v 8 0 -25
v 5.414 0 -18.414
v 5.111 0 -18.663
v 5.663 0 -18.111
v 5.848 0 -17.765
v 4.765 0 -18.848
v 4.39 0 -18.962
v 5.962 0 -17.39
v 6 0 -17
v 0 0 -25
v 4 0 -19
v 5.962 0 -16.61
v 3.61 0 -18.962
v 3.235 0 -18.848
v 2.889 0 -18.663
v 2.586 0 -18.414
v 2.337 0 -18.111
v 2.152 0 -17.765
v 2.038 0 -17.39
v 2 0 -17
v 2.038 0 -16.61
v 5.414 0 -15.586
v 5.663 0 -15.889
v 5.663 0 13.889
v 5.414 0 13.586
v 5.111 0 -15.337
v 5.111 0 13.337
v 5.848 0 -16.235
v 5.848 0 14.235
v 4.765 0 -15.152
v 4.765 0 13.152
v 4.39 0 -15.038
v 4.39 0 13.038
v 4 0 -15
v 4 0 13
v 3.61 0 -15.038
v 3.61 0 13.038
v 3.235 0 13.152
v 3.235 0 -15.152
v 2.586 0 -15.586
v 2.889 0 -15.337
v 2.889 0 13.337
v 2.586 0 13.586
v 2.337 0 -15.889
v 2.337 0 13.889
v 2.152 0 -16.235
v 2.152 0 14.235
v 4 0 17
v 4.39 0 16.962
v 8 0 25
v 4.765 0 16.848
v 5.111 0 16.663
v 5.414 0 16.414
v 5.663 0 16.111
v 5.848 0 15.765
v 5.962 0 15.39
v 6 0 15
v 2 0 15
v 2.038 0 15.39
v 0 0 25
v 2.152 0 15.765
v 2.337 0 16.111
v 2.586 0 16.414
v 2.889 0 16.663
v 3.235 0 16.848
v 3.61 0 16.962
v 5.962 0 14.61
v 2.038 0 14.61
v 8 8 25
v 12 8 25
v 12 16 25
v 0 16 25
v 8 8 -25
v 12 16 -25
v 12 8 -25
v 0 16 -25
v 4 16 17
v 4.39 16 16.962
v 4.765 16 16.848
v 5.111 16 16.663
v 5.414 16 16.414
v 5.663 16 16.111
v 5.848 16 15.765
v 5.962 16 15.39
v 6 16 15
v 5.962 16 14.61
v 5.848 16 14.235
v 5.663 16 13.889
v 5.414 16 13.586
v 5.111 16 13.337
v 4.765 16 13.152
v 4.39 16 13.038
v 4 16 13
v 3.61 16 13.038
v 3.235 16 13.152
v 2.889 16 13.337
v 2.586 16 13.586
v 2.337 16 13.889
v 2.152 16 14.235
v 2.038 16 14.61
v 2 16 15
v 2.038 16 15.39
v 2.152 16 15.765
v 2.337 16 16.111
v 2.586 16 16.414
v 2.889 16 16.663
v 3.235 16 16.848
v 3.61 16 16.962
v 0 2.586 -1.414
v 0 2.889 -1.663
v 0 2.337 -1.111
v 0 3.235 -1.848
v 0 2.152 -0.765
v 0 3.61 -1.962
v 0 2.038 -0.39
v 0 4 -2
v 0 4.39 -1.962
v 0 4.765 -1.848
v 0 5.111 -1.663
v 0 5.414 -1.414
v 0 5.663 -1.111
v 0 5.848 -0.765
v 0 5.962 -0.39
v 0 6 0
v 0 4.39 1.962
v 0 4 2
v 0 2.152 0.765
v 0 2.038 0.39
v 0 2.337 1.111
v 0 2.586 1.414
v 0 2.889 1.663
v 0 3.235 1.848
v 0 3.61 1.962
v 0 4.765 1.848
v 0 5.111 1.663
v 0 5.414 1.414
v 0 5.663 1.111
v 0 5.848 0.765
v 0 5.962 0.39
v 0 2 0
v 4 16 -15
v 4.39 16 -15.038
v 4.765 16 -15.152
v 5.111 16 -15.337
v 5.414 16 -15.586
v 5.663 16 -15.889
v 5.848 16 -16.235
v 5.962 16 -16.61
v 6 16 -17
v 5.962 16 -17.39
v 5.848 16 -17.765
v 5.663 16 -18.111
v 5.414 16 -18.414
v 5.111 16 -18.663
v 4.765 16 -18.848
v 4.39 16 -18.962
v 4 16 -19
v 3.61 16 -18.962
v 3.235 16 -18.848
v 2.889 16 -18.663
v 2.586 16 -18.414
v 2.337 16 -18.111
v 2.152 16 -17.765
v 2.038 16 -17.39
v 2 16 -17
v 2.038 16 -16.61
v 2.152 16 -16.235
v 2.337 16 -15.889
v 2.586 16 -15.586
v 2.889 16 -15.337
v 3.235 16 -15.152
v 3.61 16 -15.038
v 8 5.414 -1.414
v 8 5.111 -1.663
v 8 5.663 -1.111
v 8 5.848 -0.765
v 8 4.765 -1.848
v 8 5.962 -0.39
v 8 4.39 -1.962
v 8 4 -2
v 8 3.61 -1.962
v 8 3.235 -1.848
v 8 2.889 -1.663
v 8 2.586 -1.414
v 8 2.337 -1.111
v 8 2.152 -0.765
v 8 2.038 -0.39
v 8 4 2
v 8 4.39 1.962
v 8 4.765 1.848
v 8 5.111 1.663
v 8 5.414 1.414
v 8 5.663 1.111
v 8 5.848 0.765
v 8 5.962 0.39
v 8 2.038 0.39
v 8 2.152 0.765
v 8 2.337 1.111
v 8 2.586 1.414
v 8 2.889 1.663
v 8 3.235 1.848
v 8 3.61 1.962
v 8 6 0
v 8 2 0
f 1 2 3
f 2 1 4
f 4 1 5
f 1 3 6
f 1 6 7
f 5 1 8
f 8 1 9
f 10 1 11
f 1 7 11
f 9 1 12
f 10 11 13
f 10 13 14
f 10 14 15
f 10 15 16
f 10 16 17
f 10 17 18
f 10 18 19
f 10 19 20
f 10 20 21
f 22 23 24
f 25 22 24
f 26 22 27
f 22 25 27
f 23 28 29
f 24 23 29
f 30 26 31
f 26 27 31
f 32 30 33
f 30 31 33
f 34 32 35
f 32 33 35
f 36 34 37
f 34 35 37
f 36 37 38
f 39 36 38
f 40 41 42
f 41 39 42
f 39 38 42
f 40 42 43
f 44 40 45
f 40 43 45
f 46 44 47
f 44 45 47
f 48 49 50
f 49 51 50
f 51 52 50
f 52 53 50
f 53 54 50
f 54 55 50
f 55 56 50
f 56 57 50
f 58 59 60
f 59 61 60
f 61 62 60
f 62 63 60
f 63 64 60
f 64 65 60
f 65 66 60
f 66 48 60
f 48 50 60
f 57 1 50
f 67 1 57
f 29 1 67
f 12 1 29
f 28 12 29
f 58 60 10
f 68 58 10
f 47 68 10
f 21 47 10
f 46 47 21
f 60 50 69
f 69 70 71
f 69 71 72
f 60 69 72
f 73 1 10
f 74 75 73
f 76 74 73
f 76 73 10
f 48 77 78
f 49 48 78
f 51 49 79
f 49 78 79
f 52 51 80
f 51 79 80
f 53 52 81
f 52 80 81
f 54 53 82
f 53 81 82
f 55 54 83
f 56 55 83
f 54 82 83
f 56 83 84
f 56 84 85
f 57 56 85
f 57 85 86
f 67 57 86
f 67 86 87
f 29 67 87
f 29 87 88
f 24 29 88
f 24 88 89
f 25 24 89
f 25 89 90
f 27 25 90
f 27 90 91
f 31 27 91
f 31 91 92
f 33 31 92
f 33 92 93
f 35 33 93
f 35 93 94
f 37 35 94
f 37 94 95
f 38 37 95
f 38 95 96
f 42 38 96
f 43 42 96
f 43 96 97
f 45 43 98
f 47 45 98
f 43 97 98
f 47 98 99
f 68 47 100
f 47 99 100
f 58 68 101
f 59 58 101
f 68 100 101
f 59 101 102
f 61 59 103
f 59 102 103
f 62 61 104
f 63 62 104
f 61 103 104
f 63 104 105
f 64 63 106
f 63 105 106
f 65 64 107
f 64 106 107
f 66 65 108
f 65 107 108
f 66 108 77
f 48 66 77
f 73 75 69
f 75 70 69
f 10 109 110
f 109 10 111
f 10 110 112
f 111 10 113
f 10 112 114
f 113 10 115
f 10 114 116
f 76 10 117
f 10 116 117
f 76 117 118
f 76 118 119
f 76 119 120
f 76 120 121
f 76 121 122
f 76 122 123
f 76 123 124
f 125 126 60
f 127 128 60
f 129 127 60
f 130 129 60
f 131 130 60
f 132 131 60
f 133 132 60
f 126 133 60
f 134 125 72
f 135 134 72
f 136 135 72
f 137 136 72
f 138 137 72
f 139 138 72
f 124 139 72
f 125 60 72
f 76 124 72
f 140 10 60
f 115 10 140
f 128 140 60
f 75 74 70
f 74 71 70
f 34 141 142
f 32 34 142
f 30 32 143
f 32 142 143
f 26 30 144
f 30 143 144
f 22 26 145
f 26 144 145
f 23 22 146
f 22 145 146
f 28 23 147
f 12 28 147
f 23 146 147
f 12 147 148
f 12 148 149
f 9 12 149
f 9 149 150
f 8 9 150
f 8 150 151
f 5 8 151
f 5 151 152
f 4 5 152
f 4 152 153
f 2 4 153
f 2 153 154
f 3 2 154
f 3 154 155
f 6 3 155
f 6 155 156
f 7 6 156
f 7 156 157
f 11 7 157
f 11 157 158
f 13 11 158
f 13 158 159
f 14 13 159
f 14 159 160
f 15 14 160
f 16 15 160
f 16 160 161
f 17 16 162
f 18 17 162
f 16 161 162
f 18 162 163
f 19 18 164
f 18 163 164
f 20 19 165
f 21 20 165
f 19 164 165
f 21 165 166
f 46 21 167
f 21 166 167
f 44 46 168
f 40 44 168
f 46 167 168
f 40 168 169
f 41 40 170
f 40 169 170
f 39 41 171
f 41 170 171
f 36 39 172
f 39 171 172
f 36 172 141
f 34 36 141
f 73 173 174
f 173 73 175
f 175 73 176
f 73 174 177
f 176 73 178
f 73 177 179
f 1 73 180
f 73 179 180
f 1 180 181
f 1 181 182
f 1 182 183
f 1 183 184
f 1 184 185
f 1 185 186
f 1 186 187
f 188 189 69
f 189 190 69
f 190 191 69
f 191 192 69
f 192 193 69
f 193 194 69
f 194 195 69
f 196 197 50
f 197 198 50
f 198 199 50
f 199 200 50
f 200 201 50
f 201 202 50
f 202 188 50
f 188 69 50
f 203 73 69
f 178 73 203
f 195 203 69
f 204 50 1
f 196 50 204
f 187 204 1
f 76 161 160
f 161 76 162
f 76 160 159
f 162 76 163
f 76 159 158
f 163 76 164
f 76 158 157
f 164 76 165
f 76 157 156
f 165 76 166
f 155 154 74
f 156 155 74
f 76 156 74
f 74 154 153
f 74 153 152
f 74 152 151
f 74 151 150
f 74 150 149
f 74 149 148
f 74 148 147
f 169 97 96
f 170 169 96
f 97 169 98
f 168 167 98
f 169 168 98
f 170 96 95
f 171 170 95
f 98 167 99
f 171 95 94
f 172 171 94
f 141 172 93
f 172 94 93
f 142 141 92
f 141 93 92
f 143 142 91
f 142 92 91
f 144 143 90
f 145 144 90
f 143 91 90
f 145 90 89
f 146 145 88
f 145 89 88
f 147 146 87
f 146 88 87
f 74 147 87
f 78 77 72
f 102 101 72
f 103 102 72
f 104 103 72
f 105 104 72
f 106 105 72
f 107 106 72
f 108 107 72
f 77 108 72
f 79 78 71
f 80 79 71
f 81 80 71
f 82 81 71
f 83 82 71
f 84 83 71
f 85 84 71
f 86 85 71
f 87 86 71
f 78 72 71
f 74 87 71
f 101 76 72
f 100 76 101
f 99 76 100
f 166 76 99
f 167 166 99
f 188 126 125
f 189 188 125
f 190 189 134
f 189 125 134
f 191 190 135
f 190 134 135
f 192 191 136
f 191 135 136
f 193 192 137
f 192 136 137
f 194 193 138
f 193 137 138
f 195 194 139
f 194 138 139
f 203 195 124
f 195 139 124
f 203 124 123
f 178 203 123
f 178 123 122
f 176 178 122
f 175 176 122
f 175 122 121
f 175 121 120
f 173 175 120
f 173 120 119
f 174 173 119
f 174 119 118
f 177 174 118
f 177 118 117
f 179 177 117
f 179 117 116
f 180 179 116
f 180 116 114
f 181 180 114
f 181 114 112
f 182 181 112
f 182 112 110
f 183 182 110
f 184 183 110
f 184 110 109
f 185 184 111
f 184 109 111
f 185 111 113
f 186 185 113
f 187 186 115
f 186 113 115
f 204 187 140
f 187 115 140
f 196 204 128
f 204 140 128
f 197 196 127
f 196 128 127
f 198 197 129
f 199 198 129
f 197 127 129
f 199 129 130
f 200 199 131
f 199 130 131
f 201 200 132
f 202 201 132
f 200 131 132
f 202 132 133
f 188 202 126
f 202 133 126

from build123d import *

# Parameters (mm, degrees)
BOSS_EXTRUDE1_DEPTH = 25
SKETCH2_R           = 2
CUT_EXTRUDE1_DEPTH  = 50
SKETCH4_R           = 2
CUT_EXTRUDE2_DEPTH  = 50


with BuildPart() as part:
    # Sketch1 → Boss-Extrude1 (new, symmetric)
    with BuildSketch(Plane.XY):
        Polygon((0, 0), (0, 16), (12, 16), (12, 8), (8, 8), (8, 0), align=None)
    extrude(amount=BOSS_EXTRUDE1_DEPTH, both=True)

    # Sketch2 → Cut-Extrude1 (cut)
    with BuildSketch(Plane.ZY):
        with Locations((0, 4)):
            Circle(SKETCH2_R)
    extrude(amount=-CUT_EXTRUDE1_DEPTH, mode=Mode.SUBTRACT)

    # Sketch4 → Cut-Extrude2 (cut)
    with BuildSketch(Plane(origin=(0, 16, 0), x_dir=(1, 0, 0), z_dir=(0, 1, 0))):
        with Locations(Location((4, 17, 0), (0, 0, 270))):
            Circle(SKETCH4_R)
        with Locations(Location((4, -15, 0), (0, 0, 270))):
            Circle(SKETCH4_R)
    extrude(amount=-CUT_EXTRUDE2_DEPTH, mode=Mode.SUBTRACT)


solid = part.part
